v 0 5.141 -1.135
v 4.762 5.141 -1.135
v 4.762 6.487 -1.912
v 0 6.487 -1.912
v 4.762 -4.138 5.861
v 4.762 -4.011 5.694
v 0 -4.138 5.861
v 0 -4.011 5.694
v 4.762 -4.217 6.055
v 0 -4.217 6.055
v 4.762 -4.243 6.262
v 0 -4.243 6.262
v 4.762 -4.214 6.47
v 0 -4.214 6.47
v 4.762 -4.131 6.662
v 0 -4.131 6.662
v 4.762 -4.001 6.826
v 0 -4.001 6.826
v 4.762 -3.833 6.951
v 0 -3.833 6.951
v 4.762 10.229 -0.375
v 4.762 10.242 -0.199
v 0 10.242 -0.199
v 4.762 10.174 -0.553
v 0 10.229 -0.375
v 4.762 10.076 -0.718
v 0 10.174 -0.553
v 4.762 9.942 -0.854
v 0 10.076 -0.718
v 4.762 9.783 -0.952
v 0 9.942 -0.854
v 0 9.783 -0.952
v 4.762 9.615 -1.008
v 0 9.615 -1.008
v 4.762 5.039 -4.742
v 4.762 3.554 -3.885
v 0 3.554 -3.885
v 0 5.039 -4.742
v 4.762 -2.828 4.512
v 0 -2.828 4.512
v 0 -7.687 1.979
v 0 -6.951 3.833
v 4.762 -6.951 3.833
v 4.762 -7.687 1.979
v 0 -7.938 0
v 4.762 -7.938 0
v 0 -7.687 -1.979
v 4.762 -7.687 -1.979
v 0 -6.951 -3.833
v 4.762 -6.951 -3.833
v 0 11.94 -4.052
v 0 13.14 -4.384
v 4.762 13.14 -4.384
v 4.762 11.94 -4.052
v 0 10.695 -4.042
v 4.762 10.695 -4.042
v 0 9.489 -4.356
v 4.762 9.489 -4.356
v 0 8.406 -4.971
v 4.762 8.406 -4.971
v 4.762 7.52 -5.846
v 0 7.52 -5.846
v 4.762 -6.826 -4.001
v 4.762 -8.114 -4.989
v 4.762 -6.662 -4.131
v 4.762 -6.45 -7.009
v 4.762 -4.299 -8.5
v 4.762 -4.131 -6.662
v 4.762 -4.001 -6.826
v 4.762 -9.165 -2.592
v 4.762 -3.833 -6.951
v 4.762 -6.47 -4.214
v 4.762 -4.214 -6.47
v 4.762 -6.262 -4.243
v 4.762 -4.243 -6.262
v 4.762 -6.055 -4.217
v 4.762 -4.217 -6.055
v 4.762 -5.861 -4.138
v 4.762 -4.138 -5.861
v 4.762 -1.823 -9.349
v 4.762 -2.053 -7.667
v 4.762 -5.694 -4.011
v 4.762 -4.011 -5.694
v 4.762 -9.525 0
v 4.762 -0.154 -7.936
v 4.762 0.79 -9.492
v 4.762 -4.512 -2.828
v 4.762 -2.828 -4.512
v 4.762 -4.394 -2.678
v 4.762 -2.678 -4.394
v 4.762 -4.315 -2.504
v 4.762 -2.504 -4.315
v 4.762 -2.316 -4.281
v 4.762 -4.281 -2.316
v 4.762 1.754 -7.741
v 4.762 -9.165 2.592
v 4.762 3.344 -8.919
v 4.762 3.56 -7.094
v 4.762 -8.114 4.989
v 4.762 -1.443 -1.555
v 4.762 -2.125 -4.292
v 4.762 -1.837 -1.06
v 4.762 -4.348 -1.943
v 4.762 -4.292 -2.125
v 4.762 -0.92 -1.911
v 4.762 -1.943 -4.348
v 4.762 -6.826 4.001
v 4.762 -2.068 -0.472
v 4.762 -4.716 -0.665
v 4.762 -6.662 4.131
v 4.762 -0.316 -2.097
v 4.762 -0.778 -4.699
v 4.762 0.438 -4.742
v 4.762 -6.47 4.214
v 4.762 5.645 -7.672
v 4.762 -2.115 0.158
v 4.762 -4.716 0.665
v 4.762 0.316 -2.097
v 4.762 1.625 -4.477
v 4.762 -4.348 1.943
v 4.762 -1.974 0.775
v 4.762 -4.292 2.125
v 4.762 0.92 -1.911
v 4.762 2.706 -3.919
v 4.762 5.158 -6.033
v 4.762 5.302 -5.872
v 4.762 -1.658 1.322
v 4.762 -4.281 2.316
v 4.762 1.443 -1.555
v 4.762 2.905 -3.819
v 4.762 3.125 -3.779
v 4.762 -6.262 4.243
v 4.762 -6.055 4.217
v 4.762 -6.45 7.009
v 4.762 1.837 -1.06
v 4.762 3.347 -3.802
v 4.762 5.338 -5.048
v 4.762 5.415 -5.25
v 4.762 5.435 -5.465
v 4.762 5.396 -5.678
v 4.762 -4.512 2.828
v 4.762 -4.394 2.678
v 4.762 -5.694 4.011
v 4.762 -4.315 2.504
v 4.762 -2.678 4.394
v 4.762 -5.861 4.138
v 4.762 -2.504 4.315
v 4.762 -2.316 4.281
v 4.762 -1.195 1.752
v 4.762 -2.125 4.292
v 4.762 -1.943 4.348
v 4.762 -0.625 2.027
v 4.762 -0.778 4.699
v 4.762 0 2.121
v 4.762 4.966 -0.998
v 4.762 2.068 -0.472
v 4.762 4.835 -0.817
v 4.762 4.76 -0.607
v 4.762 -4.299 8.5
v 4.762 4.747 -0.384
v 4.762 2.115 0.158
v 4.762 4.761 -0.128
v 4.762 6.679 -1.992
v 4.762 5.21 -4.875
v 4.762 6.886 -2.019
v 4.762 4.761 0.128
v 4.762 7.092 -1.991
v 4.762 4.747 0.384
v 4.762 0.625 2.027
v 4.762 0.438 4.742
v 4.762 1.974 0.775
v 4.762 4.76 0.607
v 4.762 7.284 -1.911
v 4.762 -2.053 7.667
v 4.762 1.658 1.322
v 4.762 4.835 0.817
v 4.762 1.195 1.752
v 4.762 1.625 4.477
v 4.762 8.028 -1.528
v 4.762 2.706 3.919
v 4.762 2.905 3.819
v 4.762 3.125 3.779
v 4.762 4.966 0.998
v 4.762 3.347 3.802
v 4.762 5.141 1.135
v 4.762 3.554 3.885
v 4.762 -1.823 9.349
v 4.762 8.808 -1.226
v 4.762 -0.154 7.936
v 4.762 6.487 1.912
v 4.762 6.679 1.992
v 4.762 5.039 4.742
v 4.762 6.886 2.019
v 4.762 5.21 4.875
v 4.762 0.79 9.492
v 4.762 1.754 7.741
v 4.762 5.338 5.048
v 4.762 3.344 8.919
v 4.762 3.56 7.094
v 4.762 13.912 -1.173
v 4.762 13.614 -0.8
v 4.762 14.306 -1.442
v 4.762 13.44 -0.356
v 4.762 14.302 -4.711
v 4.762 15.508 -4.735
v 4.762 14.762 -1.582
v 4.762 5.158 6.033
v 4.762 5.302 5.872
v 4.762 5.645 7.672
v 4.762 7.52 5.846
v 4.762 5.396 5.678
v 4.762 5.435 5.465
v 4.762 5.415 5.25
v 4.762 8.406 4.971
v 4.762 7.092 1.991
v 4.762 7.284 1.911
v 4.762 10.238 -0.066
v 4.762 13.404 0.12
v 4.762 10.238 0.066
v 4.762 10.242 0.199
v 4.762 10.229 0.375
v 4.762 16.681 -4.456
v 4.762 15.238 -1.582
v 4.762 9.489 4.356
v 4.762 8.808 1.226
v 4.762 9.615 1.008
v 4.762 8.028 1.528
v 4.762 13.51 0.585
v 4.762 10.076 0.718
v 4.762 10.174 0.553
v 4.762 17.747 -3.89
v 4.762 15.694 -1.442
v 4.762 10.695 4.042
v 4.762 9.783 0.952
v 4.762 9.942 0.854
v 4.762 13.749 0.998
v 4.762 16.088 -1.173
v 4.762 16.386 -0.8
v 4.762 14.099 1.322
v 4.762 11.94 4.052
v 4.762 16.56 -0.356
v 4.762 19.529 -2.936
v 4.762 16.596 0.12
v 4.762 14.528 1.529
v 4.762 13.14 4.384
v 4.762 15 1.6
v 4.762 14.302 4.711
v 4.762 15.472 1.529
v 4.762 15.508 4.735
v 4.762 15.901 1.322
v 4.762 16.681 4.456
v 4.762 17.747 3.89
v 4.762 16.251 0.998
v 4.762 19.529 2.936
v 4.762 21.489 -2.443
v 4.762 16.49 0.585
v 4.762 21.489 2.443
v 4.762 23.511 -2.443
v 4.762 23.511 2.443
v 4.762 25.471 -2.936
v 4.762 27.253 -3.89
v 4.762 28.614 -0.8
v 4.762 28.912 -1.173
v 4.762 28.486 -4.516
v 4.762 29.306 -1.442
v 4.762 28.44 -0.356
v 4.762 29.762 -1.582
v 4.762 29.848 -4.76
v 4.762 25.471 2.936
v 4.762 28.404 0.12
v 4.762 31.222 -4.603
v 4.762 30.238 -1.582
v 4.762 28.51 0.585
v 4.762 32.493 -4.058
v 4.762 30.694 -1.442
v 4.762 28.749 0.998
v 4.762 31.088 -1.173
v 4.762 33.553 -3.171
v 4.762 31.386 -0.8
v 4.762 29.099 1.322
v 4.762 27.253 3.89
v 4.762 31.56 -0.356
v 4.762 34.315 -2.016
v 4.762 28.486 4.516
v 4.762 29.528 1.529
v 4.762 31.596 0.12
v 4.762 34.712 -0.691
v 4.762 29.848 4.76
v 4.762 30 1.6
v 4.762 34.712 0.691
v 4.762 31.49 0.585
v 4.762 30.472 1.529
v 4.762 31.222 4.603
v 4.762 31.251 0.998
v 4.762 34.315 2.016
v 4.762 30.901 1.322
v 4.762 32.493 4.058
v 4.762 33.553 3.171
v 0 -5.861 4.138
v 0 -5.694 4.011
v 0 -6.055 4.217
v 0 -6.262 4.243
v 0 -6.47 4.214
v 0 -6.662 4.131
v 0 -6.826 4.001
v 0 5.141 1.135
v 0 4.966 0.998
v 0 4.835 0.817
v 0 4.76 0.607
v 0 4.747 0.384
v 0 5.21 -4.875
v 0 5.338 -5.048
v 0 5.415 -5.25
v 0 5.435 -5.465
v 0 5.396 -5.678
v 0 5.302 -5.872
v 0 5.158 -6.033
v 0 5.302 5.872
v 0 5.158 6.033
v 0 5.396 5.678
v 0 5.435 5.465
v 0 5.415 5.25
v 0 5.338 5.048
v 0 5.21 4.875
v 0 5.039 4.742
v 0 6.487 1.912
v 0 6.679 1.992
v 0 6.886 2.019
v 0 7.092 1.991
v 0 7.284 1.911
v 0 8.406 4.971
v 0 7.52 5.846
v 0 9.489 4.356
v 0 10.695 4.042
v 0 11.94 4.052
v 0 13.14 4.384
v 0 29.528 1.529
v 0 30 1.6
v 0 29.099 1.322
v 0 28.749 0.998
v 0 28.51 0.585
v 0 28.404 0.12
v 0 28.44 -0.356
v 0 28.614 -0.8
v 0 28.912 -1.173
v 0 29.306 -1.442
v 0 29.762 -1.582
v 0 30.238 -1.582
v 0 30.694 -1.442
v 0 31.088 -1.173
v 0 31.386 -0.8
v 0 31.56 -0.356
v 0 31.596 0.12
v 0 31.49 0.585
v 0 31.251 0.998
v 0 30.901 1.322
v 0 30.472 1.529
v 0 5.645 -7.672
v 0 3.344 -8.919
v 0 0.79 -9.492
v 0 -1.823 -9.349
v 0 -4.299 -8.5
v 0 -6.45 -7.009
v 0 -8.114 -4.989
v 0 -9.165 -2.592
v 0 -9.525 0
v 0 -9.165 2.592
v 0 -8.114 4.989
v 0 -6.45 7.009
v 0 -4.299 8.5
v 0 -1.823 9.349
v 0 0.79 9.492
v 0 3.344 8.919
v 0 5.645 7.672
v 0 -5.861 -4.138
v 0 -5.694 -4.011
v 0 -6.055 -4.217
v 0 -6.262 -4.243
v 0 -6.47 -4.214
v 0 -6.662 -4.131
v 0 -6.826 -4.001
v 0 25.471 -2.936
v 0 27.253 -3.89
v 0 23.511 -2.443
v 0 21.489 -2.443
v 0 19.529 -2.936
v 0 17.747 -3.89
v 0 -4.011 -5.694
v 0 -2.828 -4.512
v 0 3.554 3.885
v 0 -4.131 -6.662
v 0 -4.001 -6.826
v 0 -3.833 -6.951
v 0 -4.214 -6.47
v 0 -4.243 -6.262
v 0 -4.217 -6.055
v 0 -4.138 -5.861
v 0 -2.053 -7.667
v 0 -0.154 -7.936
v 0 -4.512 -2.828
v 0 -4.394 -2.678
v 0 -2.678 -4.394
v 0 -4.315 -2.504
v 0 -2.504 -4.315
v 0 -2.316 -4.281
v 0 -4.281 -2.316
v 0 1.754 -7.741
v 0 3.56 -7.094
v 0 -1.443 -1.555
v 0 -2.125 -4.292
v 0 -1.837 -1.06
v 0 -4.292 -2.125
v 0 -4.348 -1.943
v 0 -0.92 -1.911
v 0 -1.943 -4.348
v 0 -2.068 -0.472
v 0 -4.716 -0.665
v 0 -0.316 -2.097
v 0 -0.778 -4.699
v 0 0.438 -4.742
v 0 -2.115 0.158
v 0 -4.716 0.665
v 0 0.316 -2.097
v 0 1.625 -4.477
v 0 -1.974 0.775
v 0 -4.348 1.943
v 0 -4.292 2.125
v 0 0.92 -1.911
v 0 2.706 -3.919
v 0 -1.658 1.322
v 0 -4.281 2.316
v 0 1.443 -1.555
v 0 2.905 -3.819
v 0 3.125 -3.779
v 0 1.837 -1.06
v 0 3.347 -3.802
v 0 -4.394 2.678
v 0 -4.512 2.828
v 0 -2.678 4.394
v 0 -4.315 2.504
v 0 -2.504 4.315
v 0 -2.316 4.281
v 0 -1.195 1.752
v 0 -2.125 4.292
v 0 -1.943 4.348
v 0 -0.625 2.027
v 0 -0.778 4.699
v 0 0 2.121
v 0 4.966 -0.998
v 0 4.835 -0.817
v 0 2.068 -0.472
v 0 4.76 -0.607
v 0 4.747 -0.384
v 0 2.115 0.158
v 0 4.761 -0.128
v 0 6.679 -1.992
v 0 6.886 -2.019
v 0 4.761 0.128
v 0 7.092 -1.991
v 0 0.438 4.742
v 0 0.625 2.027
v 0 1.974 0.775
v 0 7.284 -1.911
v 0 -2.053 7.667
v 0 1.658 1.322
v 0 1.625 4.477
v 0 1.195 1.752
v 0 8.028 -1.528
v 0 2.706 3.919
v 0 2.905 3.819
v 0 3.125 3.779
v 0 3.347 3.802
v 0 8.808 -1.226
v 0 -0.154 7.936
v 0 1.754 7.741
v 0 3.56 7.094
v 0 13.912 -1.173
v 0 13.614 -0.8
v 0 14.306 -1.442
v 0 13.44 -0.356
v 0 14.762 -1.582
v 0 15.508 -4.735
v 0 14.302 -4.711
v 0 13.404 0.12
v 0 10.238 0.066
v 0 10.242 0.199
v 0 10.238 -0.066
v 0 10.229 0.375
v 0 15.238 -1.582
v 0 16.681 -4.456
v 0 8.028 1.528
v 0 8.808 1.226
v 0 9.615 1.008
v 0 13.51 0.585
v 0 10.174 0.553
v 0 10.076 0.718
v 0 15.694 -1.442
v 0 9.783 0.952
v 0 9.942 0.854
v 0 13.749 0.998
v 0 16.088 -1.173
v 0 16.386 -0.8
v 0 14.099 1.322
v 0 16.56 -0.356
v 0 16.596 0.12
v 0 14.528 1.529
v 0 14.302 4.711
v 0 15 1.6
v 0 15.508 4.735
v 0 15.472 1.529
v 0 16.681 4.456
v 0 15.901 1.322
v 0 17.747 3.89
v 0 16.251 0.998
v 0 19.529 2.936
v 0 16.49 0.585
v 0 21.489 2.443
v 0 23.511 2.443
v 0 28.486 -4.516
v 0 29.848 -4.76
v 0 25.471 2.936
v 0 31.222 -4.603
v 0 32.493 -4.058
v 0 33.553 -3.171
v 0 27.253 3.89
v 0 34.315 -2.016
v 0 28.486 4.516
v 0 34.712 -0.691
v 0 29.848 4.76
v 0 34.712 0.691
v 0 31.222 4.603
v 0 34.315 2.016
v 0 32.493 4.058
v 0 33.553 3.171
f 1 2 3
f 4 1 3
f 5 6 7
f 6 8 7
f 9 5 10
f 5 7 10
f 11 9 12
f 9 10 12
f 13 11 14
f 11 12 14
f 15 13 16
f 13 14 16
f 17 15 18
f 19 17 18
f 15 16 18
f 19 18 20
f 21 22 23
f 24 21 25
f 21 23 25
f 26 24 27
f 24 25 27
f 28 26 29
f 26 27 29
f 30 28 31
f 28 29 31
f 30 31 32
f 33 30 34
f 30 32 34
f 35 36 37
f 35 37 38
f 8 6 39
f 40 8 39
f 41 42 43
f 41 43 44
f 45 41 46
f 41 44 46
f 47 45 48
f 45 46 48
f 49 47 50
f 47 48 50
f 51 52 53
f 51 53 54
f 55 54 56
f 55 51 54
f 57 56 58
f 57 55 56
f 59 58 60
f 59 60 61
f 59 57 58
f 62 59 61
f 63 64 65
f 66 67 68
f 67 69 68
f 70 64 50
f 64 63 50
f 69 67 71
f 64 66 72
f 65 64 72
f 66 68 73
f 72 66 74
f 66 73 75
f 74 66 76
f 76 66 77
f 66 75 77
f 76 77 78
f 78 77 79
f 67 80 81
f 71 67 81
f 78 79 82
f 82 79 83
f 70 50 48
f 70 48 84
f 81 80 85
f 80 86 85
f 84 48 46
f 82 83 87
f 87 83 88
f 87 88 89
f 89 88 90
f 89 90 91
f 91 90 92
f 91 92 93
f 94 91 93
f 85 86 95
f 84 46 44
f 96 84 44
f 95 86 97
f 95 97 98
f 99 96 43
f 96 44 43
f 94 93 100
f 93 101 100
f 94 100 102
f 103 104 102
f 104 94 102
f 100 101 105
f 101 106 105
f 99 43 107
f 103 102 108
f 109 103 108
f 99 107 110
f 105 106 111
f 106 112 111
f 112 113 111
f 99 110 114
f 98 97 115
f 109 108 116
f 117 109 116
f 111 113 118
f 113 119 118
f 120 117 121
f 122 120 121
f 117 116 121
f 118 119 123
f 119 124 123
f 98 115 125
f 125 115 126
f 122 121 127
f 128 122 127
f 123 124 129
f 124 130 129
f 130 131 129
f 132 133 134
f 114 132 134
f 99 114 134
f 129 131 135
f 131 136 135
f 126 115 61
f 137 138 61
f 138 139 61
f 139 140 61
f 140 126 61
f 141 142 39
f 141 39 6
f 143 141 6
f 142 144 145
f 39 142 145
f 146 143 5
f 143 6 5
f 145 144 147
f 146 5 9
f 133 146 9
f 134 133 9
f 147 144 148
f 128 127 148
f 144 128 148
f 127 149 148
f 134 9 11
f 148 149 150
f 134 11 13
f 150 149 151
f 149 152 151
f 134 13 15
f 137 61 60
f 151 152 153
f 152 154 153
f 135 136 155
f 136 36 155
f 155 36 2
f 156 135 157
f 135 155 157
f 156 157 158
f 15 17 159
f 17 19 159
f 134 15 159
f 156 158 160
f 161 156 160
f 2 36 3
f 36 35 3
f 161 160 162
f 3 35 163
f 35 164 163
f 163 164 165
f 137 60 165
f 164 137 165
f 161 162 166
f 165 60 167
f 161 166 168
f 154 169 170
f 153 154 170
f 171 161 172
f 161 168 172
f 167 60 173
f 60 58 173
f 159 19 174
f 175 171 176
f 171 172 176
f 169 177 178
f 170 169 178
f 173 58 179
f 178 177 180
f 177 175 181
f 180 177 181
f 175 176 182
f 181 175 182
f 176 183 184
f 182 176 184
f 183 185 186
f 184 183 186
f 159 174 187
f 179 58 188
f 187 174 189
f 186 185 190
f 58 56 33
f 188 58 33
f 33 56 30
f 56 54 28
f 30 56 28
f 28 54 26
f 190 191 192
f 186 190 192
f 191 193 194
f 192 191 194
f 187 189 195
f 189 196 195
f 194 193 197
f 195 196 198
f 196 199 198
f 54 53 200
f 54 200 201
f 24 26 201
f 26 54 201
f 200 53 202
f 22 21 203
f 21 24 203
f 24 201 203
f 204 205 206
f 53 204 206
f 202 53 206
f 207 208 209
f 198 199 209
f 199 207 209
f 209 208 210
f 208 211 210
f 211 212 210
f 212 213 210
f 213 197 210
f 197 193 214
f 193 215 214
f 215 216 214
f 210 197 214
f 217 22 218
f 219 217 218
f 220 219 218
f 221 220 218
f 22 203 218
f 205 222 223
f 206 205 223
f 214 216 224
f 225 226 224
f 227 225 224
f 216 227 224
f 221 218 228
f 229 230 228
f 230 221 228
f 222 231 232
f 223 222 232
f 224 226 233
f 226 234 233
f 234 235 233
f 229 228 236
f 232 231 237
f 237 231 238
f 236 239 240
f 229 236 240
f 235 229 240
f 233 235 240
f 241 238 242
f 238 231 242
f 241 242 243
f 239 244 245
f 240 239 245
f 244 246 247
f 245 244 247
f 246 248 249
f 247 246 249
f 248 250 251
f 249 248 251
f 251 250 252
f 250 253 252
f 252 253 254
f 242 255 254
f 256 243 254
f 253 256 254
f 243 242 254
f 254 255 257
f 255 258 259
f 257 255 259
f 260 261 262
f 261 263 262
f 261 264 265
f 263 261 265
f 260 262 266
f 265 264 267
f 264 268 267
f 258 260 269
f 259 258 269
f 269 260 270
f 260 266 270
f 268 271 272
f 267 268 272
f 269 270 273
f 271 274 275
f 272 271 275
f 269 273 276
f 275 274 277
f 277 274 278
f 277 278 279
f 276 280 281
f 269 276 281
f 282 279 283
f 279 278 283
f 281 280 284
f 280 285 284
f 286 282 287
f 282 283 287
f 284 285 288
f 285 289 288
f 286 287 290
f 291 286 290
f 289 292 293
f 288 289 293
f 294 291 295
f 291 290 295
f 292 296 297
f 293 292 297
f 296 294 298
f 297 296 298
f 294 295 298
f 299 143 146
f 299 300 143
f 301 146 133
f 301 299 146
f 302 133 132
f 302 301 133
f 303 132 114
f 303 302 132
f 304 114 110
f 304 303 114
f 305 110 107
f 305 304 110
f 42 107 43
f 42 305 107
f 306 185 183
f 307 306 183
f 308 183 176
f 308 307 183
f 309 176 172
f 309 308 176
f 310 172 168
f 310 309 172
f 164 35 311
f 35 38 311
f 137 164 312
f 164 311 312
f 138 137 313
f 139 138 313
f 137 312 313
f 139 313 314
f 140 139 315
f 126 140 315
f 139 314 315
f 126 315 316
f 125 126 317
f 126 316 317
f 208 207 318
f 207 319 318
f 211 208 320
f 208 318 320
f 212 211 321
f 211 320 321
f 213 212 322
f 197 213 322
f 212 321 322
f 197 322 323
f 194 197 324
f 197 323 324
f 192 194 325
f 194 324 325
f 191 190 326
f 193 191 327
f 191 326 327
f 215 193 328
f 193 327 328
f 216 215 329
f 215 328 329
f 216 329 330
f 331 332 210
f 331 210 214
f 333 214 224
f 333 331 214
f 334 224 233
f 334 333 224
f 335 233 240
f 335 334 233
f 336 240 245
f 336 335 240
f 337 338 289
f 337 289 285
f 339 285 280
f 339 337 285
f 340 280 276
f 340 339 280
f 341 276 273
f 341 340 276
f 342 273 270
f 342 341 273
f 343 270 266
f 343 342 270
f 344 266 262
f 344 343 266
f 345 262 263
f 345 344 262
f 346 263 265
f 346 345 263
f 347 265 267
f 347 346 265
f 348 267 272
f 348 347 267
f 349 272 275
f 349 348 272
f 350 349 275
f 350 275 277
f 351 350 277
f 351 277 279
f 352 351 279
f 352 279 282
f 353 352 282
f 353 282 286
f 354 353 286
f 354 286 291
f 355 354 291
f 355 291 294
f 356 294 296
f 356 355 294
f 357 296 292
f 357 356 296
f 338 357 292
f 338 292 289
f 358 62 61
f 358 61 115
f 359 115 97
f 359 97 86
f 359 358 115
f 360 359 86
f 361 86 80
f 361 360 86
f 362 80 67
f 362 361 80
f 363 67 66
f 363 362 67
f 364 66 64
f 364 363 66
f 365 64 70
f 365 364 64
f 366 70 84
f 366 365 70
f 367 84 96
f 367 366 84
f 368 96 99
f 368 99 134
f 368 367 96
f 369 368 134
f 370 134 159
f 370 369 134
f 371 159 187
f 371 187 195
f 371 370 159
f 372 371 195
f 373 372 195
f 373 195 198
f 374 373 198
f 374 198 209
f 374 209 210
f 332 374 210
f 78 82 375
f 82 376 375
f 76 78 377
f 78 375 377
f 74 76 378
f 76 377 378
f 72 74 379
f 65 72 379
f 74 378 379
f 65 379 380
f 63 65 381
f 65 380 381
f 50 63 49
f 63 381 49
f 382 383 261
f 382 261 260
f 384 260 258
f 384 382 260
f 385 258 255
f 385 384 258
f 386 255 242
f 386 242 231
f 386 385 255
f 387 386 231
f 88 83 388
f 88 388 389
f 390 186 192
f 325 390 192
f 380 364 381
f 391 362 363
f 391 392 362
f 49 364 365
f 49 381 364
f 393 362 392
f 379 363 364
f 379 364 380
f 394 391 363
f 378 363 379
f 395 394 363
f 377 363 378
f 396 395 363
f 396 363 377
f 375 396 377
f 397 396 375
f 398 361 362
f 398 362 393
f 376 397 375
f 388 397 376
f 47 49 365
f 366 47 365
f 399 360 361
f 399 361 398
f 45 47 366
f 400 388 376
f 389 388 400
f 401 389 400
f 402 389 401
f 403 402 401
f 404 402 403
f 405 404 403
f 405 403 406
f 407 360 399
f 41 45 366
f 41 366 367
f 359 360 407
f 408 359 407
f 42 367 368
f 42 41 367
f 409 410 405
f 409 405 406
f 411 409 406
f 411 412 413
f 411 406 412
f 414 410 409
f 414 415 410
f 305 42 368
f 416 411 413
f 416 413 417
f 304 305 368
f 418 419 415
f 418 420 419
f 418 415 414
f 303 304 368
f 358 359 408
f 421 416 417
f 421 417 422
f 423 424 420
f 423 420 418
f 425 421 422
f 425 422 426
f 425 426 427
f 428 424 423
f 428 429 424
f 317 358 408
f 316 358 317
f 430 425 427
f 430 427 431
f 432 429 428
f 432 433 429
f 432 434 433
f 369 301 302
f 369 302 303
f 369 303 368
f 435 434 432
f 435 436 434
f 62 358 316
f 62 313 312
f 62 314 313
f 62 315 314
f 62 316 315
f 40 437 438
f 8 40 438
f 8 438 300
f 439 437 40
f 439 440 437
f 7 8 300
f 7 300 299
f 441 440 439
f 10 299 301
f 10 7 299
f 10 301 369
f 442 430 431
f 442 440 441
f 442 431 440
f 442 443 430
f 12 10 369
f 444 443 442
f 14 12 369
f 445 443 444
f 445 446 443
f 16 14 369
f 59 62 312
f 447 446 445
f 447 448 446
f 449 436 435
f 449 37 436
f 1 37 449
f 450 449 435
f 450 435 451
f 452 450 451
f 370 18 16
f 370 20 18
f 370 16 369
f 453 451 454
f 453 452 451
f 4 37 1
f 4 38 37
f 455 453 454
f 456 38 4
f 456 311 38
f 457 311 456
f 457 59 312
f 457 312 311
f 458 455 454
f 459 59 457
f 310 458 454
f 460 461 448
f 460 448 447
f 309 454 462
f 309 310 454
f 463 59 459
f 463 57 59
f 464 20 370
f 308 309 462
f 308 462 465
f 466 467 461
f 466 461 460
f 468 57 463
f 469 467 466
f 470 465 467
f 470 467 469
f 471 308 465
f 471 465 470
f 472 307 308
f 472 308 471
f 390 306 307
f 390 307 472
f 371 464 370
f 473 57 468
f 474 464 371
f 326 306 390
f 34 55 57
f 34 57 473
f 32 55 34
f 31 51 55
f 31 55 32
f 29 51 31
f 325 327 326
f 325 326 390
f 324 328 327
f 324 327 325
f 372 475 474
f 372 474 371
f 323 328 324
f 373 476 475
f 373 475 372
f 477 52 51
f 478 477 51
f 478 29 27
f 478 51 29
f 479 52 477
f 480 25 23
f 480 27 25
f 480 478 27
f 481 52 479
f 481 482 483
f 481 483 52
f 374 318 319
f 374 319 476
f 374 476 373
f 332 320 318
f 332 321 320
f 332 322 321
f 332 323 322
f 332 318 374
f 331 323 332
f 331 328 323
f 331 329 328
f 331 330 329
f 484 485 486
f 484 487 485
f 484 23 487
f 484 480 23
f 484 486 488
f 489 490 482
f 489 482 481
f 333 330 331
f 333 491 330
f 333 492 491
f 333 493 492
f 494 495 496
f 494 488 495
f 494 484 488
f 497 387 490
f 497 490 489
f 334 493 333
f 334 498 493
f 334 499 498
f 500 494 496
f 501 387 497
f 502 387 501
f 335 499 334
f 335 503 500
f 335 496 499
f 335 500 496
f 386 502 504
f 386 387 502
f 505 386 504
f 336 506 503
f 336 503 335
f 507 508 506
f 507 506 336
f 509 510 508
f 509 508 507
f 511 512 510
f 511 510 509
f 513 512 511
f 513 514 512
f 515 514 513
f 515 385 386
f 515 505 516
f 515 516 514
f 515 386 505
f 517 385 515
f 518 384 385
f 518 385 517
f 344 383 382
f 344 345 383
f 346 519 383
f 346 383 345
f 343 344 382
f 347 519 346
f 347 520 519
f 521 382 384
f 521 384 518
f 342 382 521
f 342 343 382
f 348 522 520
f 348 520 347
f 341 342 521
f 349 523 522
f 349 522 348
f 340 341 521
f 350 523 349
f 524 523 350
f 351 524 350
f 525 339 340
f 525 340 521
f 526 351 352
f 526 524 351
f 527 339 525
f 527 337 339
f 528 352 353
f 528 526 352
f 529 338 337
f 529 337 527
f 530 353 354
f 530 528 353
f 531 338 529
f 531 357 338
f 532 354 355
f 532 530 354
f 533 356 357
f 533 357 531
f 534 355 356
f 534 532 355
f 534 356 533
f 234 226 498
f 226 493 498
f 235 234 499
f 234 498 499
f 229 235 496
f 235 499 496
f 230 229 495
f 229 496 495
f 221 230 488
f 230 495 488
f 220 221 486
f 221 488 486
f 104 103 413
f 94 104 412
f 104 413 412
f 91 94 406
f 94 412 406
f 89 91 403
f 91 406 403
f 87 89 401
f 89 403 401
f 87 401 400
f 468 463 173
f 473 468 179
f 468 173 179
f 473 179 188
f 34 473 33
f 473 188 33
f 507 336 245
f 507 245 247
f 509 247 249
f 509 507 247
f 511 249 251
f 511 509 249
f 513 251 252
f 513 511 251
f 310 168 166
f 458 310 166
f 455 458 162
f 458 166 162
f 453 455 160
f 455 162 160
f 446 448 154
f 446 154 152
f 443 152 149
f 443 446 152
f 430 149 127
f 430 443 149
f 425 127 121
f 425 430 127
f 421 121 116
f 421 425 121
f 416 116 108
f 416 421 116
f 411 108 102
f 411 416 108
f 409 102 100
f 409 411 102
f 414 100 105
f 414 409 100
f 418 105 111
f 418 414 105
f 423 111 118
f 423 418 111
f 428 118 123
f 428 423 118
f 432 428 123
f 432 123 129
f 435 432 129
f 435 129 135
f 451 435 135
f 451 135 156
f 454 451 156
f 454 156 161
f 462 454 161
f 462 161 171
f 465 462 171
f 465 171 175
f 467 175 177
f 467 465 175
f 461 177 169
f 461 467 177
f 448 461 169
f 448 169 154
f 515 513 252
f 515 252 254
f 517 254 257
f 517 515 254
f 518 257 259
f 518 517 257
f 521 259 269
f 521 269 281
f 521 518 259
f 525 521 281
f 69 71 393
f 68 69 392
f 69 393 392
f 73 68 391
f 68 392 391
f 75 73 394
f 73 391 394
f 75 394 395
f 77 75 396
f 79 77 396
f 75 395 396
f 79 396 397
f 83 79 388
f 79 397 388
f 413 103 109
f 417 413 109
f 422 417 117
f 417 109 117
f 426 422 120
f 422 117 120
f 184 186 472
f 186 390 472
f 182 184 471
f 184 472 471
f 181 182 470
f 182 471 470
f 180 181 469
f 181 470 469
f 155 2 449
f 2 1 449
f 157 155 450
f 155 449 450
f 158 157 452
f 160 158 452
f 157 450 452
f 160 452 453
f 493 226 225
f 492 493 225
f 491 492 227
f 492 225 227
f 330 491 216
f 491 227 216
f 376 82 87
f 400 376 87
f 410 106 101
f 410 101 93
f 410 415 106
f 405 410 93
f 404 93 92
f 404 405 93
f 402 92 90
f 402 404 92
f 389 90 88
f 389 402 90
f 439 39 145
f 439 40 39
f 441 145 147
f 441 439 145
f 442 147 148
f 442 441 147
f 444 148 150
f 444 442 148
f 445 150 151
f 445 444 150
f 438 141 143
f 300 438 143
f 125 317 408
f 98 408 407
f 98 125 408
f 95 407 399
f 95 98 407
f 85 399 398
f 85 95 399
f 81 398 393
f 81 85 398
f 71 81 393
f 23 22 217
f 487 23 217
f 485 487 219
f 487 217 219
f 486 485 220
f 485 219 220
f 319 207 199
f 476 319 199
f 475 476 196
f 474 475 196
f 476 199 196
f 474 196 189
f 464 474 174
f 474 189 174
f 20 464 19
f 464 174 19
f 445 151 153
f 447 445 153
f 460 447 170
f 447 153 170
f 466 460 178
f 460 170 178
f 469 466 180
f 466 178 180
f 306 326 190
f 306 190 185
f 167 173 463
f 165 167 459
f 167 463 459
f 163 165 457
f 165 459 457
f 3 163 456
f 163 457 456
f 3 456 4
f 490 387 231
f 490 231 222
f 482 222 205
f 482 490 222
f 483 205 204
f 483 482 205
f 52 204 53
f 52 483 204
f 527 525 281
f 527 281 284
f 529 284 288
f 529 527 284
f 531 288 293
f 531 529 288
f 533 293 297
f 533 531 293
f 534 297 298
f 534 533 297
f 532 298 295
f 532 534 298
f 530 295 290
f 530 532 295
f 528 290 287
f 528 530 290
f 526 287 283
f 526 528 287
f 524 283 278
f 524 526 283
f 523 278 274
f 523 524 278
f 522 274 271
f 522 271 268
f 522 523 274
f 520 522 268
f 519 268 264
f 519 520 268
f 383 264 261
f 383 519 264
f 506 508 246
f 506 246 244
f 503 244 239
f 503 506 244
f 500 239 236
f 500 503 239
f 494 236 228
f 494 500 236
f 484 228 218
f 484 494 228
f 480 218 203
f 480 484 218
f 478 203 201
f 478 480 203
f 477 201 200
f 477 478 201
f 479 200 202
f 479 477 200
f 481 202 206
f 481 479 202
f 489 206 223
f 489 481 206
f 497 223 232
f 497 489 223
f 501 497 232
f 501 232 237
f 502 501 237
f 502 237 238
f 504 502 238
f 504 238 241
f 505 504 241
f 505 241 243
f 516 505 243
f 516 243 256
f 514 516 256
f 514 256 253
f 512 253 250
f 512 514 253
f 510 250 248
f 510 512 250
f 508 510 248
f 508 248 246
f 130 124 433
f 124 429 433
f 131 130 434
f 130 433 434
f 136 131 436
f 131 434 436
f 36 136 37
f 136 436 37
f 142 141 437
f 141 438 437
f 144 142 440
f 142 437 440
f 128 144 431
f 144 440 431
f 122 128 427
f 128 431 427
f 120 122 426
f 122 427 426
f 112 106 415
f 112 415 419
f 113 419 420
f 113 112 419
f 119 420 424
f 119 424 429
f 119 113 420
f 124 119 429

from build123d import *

# Parameters (mm, degrees)
SKETCH1_R           = 2.1209
SKETCH1_R_2         = 1.6002
BOSS_EXTRUDE1_DEPTH = 4.7625
CUT_EXTRUDE1_DEPTH  = 37.357096109
FILLET1_R           = 0.79375


with BuildPart() as part:
    # Sketch1 → Boss-Extrude1 (new body)
    with BuildSketch(Plane(origin=(0, 0, 0), x_dir=(0, 0, -1), z_dir=(1, 0, 0))):
        with BuildLine():
            ThreePointArc((-3.890248837, 27.252752244), (0, 34.7625), (3.890248837, 27.252752244))
            ThreePointArc((3.890248837, 27.252752244), (2.38125, 22.5), (3.890248837, 17.747247756))
            ThreePointArc((3.890248837, 17.747247756), (4.735348571, 15.507819022), (4.384317755, 13.140117187))
            ThreePointArc((4.384317755, 13.140117187), (4.159430641, 10.081636558), (5.845757006, 7.52015625))
            ThreePointArc((5.845757006, 7.52015625), (0, -9.525), (-5.845757006, 7.52015625))
            ThreePointArc((-5.845757006, 7.52015625), (-4.159430641, 10.081636558), (-4.384317755, 13.140117187))
            ThreePointArc((-4.384317755, 13.140117187), (-4.735348571, 15.507819022), (-3.890248837, 17.747247756))
            ThreePointArc((-3.890248837, 17.747247756), (-2.38125, 22.5), (-3.890248837, 27.252752244))
        make_face()
        with Locations(Location((0, 0, 0), (0, 0, 180))):
            Circle(SKETCH1_R, mode=Mode.SUBTRACT)
        with Locations(Location((0, 15, 0), (0, 0, 180))):
            Circle(SKETCH1_R_2, mode=Mode.SUBTRACT)
        with Locations(Location((0, 30, 0), (0, 0, 180))):
            Circle(SKETCH1_R_2, mode=Mode.SUBTRACT)
    extrude(amount=BOSS_EXTRUDE1_DEPTH)

    # Sketch2 → Cut-Extrude1 (cut, through all)
    with BuildSketch(Plane(origin=(4.7625, 0, 0), x_dir=(0, 0, -1), z_dir=(1, 0, 0))):
        with BuildLine():
            Line((-6.391057432, -4.707259409), (-4.102559861, -2.418761839))
            ThreePointArc((-4.102559861, -2.418761839), (-4.744354453, 0.41533971), (-3.619879359, 3.094814967))
            Line((-3.619879359, 3.094814967), (-5.263380295, 5.941442091))
            ThreePointArc((-5.263380295, 5.941442091), (-7.893363706, 0.835892131), (-6.391057432, -4.707259409))
        make_face()
        with BuildLine():
            Line((-2.418761839, -4.102559861), (-4.707259409, -6.391057432))
            ThreePointArc((-4.707259409, -6.391057432), (0, -7.9375), (4.707259409, -6.391057432))
            Line((4.707259409, -6.391057432), (2.418761839, -4.102559861))
            ThreePointArc((2.418761839, -4.102559861), (0, -4.7625), (-2.418761839, -4.102559861))
        make_face()
        with BuildLine():
            Line((-2.149945089, 6.898814128), (-0.870248702, 4.682314967))
            ThreePointArc((-0.870248702, 4.682314967), (0, 4.7625), (0.870248702, 4.682314967))
            Line((0.870248702, 4.682314967), (2.149945089, 6.898814128))
            ThreePointArc((2.149945089, 6.898814128), (1.320371493, 8.536647417), (0.889277805, 10.32126179))
            ThreePointArc((0.889277805, 10.32126179), (0, 10.2375), (-0.889277805, 10.32126179))
            ThreePointArc((-0.889277805, 10.32126179), (-1.320371493, 8.536647417), (-2.149945089, 6.898814128))
        make_face()
        with BuildLine():
            Line((6.391057432, -4.707259409), (4.102559861, -2.418761839))
            ThreePointArc((4.102559861, -2.418761839), (4.744354453, 0.41533971), (3.619879359, 3.094814967))
            Line((3.619879359, 3.094814967), (5.263380295, 5.941442091))
            ThreePointArc((5.263380295, 5.941442091), (7.893363706, 0.835892131), (6.391057432, -4.707259409))
        make_face()
    extrude(amount=-CUT_EXTRUDE1_DEPTH, mode=Mode.SUBTRACT)

    # Fillet1
    fillet1_edges = [part.edges().sort_by_distance(p)[0] for p in [
        (2.38125, -4.102559861, 2.418761839),
        (2.38125, -4.102559861, -2.418761839),
        (2.38125, -6.391057432, -4.707259409),
        (2.38125, -6.391057432, 4.707259409),
        (2.38125, 4.682314967, -0.870248702),
        (2.38125, 4.682314967, 0.870248702),
        (2.38125, 6.898814128, 2.149945089),
        (2.38125, 10.32126179, 0.889277805),
        (2.38125, 10.32126179, -0.889277805),
        (2.38125, 6.898814128, -2.149945089),
        (2.38125, 5.941442091, -5.263380295),
        (2.38125, -4.707259409, -6.391057432),
        (2.38125, -2.418761839, -4.102559861),
        (2.38125, 3.094814967, -3.619879359),
        (2.38125, -4.707259409, 6.391057432),
        (2.38125, 5.941442091, 5.263380295),
        (2.38125, 3.094814967, 3.619879359),
        (2.38125, -2.418761839, 4.102559861),
    ]]
    fillet(fillet1_edges, radius=FILLET1_R)


solid = part.part
